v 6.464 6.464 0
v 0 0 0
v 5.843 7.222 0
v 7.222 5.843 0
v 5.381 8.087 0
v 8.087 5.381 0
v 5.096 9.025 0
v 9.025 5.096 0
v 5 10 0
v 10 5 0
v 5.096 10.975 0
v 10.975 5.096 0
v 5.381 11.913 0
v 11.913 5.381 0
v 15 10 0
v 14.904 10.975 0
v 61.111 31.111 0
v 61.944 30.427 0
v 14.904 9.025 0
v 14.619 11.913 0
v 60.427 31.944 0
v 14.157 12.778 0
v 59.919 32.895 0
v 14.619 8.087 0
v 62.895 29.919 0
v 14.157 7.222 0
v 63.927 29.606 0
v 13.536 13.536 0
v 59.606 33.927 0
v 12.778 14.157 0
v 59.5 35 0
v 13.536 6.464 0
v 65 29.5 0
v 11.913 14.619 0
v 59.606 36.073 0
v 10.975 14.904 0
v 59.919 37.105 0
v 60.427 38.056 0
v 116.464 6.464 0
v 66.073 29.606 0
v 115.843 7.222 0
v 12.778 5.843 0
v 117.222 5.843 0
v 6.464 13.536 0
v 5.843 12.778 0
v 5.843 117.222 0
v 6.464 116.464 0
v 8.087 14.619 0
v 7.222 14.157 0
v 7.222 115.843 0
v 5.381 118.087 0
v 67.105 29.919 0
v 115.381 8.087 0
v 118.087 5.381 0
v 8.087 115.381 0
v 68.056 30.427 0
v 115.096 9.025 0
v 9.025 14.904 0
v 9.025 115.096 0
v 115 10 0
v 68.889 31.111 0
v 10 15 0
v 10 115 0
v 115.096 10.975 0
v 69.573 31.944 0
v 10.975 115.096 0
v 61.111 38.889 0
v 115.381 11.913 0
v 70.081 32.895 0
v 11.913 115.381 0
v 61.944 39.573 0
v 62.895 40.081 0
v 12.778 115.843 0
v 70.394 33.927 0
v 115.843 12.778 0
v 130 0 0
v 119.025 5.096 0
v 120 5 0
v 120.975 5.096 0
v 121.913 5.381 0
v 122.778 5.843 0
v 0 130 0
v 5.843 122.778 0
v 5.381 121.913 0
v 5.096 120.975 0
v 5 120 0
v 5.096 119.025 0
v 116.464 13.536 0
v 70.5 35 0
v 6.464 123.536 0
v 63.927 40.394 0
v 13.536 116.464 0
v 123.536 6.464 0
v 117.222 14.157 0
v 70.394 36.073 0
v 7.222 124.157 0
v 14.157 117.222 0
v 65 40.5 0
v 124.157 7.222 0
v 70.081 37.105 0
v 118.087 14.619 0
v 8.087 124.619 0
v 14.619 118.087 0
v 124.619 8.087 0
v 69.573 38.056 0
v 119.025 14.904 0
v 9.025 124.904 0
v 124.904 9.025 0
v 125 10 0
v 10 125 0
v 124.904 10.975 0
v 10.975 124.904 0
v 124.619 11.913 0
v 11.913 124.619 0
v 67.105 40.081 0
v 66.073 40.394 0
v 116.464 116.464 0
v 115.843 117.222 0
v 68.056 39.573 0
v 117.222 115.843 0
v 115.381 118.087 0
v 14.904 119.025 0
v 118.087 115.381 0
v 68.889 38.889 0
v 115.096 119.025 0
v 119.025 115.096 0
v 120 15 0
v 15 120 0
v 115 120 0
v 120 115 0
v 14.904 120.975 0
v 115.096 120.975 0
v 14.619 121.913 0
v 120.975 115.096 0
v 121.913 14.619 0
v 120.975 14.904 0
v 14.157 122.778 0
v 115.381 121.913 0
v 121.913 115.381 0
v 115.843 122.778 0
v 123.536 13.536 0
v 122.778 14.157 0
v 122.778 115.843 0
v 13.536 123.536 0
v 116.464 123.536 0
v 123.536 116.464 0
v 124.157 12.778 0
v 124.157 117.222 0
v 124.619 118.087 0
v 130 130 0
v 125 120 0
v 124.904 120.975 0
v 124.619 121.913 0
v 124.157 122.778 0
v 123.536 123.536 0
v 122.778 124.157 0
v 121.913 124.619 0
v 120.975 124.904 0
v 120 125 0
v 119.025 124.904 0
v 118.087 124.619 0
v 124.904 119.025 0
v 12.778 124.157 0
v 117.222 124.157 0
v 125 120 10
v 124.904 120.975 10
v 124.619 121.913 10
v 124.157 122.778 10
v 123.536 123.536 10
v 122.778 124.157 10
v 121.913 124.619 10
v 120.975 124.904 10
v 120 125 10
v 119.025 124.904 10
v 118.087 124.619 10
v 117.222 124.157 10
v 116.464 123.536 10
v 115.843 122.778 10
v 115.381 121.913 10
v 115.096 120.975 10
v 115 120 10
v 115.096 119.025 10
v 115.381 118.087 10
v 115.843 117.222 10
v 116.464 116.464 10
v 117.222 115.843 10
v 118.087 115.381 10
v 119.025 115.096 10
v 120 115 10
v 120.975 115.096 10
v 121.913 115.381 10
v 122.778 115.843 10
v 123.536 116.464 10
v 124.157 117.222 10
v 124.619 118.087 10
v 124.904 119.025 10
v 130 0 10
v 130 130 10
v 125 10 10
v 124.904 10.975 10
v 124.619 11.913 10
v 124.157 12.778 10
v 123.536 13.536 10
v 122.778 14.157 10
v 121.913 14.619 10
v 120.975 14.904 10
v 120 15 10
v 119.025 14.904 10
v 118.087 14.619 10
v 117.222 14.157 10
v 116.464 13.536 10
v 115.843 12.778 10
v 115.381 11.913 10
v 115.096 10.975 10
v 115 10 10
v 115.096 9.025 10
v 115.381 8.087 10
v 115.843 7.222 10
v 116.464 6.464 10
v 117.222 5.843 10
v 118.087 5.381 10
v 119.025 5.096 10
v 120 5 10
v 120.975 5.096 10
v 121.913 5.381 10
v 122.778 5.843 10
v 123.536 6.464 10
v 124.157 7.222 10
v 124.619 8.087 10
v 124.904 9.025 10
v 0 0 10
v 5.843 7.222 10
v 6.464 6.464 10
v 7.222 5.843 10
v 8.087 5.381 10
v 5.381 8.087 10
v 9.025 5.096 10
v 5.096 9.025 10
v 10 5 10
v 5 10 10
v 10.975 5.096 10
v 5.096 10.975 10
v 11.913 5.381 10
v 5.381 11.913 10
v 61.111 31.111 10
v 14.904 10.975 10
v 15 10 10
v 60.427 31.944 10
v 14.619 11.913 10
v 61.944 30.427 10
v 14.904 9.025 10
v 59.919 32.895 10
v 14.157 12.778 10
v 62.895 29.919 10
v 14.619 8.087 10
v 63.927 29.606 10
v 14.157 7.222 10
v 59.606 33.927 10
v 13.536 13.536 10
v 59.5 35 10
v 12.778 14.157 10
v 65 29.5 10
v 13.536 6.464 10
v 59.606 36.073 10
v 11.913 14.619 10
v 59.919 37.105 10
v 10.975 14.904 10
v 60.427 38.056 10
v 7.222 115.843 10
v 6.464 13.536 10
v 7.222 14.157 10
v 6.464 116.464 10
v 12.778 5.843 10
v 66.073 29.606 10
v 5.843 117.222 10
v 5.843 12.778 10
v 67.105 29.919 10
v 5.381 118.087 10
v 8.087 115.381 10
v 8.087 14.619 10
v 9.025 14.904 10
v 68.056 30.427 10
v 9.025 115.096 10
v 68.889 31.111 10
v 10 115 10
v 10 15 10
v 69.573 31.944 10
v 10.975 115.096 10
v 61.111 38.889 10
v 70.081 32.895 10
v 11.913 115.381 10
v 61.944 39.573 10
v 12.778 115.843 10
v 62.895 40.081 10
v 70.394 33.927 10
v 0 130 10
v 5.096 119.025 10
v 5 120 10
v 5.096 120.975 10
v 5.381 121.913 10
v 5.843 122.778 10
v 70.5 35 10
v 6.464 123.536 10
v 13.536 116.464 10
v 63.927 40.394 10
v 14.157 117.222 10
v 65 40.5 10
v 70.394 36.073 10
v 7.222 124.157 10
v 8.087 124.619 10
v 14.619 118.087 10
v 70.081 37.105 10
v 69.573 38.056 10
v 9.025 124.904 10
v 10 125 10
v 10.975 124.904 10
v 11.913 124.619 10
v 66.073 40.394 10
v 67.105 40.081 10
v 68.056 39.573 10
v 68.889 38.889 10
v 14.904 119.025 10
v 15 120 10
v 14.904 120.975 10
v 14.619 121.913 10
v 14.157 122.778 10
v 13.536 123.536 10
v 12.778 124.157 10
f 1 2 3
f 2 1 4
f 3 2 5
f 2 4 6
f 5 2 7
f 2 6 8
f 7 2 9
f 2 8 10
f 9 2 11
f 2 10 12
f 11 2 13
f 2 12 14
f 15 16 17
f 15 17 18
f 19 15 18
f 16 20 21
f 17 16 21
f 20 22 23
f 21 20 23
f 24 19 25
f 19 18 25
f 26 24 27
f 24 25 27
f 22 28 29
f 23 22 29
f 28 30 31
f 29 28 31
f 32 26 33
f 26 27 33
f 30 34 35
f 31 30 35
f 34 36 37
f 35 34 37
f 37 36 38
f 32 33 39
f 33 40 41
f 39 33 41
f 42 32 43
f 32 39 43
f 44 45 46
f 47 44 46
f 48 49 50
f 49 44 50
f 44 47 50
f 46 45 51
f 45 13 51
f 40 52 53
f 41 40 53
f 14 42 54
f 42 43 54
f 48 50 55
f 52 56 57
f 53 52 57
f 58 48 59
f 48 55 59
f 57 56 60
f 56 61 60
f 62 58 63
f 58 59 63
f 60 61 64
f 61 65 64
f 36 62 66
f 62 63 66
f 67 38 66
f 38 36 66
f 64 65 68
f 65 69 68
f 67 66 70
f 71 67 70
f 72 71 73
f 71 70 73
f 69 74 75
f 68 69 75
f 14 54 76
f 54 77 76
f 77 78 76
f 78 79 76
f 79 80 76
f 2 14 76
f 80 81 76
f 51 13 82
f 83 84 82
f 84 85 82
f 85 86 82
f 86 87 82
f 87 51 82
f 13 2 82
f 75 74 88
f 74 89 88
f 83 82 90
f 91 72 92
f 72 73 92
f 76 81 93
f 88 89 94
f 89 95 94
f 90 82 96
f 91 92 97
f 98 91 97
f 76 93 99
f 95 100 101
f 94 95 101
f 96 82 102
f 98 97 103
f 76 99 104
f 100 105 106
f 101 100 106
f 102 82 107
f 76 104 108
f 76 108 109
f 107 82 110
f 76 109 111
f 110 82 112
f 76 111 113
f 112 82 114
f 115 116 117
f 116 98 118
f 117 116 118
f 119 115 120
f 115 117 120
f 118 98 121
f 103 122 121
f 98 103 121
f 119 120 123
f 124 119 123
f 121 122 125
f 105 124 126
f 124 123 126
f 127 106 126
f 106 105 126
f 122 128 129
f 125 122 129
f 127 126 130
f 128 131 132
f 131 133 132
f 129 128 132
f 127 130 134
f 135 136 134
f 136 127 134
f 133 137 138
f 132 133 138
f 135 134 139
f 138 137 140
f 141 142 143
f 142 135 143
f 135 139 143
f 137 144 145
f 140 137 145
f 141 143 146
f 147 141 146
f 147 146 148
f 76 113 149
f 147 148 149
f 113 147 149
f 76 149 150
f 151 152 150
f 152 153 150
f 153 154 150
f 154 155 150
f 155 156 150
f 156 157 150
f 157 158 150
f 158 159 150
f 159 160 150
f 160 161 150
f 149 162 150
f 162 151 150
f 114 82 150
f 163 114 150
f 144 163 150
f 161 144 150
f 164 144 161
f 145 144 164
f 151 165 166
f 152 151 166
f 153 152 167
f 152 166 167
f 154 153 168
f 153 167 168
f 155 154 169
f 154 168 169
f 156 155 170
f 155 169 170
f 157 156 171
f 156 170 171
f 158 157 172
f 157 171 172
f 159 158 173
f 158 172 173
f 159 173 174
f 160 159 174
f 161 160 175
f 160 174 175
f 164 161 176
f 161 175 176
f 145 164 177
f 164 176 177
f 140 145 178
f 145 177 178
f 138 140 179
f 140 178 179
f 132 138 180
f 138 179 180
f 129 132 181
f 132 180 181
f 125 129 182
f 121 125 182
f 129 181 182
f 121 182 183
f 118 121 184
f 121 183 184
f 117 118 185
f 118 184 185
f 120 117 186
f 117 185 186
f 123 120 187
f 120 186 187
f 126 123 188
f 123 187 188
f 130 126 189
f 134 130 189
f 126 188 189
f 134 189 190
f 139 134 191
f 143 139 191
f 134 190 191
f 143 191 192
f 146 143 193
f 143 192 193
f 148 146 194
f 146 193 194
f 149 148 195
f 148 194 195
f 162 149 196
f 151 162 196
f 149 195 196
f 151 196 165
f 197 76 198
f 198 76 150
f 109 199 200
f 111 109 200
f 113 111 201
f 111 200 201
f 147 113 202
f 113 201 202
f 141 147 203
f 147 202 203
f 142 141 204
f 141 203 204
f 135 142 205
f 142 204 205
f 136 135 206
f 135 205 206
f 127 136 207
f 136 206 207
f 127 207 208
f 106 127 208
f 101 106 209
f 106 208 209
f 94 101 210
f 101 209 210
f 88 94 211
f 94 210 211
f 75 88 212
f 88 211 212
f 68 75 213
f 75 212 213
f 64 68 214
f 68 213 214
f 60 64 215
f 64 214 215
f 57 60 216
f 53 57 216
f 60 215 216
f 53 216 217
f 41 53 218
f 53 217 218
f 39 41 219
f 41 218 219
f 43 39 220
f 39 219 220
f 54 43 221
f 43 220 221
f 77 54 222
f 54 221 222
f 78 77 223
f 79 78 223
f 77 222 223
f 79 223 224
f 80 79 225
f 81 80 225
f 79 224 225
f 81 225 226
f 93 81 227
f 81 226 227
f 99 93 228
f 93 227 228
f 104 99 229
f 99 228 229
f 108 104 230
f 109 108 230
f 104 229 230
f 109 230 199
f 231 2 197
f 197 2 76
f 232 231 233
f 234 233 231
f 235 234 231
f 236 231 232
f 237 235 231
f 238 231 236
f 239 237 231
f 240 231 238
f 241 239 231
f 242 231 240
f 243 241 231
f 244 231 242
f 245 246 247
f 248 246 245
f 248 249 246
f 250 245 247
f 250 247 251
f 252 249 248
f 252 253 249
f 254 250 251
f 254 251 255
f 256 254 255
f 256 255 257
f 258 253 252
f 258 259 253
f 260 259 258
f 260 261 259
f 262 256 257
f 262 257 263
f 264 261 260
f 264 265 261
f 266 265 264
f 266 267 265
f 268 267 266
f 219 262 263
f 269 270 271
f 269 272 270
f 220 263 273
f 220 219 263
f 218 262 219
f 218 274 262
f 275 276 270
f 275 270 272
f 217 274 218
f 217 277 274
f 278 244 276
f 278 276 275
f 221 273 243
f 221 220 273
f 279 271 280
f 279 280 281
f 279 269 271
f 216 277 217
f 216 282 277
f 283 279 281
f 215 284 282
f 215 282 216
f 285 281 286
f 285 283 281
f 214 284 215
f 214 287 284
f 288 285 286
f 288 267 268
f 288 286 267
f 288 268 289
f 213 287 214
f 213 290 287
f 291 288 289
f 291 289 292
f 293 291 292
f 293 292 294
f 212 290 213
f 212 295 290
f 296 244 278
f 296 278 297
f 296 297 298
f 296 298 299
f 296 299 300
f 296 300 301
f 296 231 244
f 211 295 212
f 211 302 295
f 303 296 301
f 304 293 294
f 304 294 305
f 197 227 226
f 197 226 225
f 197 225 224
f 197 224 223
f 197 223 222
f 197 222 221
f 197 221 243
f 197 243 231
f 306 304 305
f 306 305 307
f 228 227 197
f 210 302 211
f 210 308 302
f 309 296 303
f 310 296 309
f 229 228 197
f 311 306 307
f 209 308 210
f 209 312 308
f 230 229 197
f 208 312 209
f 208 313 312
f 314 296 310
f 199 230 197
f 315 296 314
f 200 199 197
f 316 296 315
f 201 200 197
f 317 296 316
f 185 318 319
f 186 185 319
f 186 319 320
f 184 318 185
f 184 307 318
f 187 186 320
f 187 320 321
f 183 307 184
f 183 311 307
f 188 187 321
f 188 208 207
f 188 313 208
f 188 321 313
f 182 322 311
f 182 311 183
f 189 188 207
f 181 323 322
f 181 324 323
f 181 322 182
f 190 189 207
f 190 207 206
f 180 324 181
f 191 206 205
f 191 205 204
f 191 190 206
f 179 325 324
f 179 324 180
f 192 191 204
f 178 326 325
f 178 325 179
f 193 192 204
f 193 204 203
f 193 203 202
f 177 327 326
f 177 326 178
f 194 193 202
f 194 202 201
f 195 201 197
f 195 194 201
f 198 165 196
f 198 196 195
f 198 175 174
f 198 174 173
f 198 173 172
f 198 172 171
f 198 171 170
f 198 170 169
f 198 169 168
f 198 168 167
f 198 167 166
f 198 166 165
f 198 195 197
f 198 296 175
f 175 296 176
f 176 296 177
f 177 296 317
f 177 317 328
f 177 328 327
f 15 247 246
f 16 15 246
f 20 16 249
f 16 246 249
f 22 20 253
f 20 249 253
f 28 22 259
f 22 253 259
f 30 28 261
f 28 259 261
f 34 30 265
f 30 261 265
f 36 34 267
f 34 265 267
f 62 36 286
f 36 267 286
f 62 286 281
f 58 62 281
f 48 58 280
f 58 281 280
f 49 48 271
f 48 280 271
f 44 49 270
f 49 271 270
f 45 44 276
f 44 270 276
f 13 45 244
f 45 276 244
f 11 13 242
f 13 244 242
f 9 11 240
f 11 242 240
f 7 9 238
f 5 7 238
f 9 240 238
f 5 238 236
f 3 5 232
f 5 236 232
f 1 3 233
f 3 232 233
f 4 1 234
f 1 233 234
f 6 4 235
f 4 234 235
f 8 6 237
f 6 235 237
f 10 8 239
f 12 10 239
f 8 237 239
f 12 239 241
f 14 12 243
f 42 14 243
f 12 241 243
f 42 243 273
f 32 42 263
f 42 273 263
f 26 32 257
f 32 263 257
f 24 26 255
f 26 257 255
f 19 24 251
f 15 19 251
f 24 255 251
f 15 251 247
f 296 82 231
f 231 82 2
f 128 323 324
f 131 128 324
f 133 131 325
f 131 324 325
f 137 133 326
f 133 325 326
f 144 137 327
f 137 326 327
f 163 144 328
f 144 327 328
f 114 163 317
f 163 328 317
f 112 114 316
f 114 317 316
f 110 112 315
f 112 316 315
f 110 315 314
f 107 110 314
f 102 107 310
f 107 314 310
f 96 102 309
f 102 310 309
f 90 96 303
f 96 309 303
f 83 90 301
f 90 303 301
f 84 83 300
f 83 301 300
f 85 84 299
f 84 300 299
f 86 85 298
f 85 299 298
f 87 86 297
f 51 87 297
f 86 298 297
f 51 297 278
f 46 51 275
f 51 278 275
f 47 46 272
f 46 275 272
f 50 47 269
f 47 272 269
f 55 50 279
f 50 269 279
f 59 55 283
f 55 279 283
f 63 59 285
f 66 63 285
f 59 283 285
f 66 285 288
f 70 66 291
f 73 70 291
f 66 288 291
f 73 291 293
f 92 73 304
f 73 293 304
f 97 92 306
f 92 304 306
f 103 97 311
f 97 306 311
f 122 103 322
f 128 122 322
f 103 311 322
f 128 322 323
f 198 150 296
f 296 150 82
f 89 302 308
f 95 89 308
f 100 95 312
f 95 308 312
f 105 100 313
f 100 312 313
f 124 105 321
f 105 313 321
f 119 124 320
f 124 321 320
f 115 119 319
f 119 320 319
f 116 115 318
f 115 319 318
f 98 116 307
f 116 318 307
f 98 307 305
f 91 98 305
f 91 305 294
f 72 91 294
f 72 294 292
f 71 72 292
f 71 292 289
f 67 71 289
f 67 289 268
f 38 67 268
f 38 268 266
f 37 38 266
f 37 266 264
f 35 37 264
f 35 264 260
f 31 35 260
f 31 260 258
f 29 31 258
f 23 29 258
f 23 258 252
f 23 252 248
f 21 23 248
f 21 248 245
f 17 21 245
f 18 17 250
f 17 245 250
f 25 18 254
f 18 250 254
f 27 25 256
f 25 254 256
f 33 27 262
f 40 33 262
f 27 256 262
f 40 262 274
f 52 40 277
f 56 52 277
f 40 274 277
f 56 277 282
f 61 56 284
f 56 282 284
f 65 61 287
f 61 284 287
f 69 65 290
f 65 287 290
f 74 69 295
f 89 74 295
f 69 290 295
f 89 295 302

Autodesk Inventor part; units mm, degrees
ref_plane "YZ Plane" through (0, 0, 0) normal (1, 0, 0) x (0, 1, 0)
ref_plane "XZ Plane" through (0, 0, 0) normal (0, 1, 0) x (-1, 0, 0)
ref_plane "XY Plane" through (0, 0, 0) normal (0, 0, 1) x (1, 0, 0)
sketch "Sketch1" plane through (0, 0, 0) normal (0, 0, 1) x (1, 0, 0)
  line L0 (0, 0) -> (130, 0)
  line L1 (130, 0) -> (130, 130)
  line L2 (130, 130) -> (0, 130)
  line L3 (0, 130) -> (0, 0)
  dimension "d0" = 130
  dimension "d1" = 130
extrude "Extrusion1" add sketch "Sketch1" along normal blind 10
sketch "Sketch2" plane through (0, 0, 10) normal (0, 0, 1) x (1, 0, 0)
  line L0 (130, 130) -> (0, 130) projected
  line L1 (0, 130) -> (10, 130)
  line L2 (10, 130) -> (10, 0)
  line L3 (10, 0) -> (120, 0)
  line L4 (0, 0) -> (130, 0) projected
  line L5 (120, 0) -> (120, 130)
  line L6 (120, 130) -> (120, 120)
  line L7 (120, 120) -> (10, 120)
  line L8 (130, 0) -> (130, 10)
  line L9 (130, 0) -> (130, 130) projected
  line L10 (130, 10) -> (0, 10)
  line L11 (0, 130) -> (0, 0) projected
  circle A0 centre (10, 120) radius 5
  circle A1 centre (120, 120) radius 5
  circle A2 centre (120, 10) radius 5
  circle A3 centre (10, 10) radius 5
  dimension "d4" = 10
  dimension "d5" = 130
  dimension "d6" = 110
  dimension "d7" = 10
  dimension "d8" = 10
  dimension "d9" = 130
  dimension "d10" = 10
  dimension "d11" = 10
  dimension "d12" = 10
  dimension "d13" = 10
extrude "Extrusion2" cut sketch "Sketch2" against normal through all contours A1 L5 | L5 L7 A1 | A2 L5 L10 | L10 L5 A2 | A0 L7 L2 | L2 A0 | L5 A1 L7 | L10 A2 L5 | L5 A2 L10 | L7 A0 L2 | A3 L2 L10 | L10 L2 A3 | A3 L10 L2 | L2 L10 A3
sketch "Sketch3" plane through (0, 0, 10) normal (0, 0, 1) x (1, 0, 0)
  line L0 (0, 0) -> (130, 0) projected
  line L1 (65, 0) -> (30, 0)
  line L2 (65, 0) -> (65, 35)
  circle A0 centre (65, 35) radius 5.5
  dimension "d16" = 65
  dimension "d17" = 35
  dimension "d18" = 35
  dimension "d19" = 11
extrude "Extrusion3" cut sketch "Sketch3" against normal through all
thread "Thread1" size "M11x1.5" class "6H" standard "ANSI Metric M Profile" full length
properties part number "2"
